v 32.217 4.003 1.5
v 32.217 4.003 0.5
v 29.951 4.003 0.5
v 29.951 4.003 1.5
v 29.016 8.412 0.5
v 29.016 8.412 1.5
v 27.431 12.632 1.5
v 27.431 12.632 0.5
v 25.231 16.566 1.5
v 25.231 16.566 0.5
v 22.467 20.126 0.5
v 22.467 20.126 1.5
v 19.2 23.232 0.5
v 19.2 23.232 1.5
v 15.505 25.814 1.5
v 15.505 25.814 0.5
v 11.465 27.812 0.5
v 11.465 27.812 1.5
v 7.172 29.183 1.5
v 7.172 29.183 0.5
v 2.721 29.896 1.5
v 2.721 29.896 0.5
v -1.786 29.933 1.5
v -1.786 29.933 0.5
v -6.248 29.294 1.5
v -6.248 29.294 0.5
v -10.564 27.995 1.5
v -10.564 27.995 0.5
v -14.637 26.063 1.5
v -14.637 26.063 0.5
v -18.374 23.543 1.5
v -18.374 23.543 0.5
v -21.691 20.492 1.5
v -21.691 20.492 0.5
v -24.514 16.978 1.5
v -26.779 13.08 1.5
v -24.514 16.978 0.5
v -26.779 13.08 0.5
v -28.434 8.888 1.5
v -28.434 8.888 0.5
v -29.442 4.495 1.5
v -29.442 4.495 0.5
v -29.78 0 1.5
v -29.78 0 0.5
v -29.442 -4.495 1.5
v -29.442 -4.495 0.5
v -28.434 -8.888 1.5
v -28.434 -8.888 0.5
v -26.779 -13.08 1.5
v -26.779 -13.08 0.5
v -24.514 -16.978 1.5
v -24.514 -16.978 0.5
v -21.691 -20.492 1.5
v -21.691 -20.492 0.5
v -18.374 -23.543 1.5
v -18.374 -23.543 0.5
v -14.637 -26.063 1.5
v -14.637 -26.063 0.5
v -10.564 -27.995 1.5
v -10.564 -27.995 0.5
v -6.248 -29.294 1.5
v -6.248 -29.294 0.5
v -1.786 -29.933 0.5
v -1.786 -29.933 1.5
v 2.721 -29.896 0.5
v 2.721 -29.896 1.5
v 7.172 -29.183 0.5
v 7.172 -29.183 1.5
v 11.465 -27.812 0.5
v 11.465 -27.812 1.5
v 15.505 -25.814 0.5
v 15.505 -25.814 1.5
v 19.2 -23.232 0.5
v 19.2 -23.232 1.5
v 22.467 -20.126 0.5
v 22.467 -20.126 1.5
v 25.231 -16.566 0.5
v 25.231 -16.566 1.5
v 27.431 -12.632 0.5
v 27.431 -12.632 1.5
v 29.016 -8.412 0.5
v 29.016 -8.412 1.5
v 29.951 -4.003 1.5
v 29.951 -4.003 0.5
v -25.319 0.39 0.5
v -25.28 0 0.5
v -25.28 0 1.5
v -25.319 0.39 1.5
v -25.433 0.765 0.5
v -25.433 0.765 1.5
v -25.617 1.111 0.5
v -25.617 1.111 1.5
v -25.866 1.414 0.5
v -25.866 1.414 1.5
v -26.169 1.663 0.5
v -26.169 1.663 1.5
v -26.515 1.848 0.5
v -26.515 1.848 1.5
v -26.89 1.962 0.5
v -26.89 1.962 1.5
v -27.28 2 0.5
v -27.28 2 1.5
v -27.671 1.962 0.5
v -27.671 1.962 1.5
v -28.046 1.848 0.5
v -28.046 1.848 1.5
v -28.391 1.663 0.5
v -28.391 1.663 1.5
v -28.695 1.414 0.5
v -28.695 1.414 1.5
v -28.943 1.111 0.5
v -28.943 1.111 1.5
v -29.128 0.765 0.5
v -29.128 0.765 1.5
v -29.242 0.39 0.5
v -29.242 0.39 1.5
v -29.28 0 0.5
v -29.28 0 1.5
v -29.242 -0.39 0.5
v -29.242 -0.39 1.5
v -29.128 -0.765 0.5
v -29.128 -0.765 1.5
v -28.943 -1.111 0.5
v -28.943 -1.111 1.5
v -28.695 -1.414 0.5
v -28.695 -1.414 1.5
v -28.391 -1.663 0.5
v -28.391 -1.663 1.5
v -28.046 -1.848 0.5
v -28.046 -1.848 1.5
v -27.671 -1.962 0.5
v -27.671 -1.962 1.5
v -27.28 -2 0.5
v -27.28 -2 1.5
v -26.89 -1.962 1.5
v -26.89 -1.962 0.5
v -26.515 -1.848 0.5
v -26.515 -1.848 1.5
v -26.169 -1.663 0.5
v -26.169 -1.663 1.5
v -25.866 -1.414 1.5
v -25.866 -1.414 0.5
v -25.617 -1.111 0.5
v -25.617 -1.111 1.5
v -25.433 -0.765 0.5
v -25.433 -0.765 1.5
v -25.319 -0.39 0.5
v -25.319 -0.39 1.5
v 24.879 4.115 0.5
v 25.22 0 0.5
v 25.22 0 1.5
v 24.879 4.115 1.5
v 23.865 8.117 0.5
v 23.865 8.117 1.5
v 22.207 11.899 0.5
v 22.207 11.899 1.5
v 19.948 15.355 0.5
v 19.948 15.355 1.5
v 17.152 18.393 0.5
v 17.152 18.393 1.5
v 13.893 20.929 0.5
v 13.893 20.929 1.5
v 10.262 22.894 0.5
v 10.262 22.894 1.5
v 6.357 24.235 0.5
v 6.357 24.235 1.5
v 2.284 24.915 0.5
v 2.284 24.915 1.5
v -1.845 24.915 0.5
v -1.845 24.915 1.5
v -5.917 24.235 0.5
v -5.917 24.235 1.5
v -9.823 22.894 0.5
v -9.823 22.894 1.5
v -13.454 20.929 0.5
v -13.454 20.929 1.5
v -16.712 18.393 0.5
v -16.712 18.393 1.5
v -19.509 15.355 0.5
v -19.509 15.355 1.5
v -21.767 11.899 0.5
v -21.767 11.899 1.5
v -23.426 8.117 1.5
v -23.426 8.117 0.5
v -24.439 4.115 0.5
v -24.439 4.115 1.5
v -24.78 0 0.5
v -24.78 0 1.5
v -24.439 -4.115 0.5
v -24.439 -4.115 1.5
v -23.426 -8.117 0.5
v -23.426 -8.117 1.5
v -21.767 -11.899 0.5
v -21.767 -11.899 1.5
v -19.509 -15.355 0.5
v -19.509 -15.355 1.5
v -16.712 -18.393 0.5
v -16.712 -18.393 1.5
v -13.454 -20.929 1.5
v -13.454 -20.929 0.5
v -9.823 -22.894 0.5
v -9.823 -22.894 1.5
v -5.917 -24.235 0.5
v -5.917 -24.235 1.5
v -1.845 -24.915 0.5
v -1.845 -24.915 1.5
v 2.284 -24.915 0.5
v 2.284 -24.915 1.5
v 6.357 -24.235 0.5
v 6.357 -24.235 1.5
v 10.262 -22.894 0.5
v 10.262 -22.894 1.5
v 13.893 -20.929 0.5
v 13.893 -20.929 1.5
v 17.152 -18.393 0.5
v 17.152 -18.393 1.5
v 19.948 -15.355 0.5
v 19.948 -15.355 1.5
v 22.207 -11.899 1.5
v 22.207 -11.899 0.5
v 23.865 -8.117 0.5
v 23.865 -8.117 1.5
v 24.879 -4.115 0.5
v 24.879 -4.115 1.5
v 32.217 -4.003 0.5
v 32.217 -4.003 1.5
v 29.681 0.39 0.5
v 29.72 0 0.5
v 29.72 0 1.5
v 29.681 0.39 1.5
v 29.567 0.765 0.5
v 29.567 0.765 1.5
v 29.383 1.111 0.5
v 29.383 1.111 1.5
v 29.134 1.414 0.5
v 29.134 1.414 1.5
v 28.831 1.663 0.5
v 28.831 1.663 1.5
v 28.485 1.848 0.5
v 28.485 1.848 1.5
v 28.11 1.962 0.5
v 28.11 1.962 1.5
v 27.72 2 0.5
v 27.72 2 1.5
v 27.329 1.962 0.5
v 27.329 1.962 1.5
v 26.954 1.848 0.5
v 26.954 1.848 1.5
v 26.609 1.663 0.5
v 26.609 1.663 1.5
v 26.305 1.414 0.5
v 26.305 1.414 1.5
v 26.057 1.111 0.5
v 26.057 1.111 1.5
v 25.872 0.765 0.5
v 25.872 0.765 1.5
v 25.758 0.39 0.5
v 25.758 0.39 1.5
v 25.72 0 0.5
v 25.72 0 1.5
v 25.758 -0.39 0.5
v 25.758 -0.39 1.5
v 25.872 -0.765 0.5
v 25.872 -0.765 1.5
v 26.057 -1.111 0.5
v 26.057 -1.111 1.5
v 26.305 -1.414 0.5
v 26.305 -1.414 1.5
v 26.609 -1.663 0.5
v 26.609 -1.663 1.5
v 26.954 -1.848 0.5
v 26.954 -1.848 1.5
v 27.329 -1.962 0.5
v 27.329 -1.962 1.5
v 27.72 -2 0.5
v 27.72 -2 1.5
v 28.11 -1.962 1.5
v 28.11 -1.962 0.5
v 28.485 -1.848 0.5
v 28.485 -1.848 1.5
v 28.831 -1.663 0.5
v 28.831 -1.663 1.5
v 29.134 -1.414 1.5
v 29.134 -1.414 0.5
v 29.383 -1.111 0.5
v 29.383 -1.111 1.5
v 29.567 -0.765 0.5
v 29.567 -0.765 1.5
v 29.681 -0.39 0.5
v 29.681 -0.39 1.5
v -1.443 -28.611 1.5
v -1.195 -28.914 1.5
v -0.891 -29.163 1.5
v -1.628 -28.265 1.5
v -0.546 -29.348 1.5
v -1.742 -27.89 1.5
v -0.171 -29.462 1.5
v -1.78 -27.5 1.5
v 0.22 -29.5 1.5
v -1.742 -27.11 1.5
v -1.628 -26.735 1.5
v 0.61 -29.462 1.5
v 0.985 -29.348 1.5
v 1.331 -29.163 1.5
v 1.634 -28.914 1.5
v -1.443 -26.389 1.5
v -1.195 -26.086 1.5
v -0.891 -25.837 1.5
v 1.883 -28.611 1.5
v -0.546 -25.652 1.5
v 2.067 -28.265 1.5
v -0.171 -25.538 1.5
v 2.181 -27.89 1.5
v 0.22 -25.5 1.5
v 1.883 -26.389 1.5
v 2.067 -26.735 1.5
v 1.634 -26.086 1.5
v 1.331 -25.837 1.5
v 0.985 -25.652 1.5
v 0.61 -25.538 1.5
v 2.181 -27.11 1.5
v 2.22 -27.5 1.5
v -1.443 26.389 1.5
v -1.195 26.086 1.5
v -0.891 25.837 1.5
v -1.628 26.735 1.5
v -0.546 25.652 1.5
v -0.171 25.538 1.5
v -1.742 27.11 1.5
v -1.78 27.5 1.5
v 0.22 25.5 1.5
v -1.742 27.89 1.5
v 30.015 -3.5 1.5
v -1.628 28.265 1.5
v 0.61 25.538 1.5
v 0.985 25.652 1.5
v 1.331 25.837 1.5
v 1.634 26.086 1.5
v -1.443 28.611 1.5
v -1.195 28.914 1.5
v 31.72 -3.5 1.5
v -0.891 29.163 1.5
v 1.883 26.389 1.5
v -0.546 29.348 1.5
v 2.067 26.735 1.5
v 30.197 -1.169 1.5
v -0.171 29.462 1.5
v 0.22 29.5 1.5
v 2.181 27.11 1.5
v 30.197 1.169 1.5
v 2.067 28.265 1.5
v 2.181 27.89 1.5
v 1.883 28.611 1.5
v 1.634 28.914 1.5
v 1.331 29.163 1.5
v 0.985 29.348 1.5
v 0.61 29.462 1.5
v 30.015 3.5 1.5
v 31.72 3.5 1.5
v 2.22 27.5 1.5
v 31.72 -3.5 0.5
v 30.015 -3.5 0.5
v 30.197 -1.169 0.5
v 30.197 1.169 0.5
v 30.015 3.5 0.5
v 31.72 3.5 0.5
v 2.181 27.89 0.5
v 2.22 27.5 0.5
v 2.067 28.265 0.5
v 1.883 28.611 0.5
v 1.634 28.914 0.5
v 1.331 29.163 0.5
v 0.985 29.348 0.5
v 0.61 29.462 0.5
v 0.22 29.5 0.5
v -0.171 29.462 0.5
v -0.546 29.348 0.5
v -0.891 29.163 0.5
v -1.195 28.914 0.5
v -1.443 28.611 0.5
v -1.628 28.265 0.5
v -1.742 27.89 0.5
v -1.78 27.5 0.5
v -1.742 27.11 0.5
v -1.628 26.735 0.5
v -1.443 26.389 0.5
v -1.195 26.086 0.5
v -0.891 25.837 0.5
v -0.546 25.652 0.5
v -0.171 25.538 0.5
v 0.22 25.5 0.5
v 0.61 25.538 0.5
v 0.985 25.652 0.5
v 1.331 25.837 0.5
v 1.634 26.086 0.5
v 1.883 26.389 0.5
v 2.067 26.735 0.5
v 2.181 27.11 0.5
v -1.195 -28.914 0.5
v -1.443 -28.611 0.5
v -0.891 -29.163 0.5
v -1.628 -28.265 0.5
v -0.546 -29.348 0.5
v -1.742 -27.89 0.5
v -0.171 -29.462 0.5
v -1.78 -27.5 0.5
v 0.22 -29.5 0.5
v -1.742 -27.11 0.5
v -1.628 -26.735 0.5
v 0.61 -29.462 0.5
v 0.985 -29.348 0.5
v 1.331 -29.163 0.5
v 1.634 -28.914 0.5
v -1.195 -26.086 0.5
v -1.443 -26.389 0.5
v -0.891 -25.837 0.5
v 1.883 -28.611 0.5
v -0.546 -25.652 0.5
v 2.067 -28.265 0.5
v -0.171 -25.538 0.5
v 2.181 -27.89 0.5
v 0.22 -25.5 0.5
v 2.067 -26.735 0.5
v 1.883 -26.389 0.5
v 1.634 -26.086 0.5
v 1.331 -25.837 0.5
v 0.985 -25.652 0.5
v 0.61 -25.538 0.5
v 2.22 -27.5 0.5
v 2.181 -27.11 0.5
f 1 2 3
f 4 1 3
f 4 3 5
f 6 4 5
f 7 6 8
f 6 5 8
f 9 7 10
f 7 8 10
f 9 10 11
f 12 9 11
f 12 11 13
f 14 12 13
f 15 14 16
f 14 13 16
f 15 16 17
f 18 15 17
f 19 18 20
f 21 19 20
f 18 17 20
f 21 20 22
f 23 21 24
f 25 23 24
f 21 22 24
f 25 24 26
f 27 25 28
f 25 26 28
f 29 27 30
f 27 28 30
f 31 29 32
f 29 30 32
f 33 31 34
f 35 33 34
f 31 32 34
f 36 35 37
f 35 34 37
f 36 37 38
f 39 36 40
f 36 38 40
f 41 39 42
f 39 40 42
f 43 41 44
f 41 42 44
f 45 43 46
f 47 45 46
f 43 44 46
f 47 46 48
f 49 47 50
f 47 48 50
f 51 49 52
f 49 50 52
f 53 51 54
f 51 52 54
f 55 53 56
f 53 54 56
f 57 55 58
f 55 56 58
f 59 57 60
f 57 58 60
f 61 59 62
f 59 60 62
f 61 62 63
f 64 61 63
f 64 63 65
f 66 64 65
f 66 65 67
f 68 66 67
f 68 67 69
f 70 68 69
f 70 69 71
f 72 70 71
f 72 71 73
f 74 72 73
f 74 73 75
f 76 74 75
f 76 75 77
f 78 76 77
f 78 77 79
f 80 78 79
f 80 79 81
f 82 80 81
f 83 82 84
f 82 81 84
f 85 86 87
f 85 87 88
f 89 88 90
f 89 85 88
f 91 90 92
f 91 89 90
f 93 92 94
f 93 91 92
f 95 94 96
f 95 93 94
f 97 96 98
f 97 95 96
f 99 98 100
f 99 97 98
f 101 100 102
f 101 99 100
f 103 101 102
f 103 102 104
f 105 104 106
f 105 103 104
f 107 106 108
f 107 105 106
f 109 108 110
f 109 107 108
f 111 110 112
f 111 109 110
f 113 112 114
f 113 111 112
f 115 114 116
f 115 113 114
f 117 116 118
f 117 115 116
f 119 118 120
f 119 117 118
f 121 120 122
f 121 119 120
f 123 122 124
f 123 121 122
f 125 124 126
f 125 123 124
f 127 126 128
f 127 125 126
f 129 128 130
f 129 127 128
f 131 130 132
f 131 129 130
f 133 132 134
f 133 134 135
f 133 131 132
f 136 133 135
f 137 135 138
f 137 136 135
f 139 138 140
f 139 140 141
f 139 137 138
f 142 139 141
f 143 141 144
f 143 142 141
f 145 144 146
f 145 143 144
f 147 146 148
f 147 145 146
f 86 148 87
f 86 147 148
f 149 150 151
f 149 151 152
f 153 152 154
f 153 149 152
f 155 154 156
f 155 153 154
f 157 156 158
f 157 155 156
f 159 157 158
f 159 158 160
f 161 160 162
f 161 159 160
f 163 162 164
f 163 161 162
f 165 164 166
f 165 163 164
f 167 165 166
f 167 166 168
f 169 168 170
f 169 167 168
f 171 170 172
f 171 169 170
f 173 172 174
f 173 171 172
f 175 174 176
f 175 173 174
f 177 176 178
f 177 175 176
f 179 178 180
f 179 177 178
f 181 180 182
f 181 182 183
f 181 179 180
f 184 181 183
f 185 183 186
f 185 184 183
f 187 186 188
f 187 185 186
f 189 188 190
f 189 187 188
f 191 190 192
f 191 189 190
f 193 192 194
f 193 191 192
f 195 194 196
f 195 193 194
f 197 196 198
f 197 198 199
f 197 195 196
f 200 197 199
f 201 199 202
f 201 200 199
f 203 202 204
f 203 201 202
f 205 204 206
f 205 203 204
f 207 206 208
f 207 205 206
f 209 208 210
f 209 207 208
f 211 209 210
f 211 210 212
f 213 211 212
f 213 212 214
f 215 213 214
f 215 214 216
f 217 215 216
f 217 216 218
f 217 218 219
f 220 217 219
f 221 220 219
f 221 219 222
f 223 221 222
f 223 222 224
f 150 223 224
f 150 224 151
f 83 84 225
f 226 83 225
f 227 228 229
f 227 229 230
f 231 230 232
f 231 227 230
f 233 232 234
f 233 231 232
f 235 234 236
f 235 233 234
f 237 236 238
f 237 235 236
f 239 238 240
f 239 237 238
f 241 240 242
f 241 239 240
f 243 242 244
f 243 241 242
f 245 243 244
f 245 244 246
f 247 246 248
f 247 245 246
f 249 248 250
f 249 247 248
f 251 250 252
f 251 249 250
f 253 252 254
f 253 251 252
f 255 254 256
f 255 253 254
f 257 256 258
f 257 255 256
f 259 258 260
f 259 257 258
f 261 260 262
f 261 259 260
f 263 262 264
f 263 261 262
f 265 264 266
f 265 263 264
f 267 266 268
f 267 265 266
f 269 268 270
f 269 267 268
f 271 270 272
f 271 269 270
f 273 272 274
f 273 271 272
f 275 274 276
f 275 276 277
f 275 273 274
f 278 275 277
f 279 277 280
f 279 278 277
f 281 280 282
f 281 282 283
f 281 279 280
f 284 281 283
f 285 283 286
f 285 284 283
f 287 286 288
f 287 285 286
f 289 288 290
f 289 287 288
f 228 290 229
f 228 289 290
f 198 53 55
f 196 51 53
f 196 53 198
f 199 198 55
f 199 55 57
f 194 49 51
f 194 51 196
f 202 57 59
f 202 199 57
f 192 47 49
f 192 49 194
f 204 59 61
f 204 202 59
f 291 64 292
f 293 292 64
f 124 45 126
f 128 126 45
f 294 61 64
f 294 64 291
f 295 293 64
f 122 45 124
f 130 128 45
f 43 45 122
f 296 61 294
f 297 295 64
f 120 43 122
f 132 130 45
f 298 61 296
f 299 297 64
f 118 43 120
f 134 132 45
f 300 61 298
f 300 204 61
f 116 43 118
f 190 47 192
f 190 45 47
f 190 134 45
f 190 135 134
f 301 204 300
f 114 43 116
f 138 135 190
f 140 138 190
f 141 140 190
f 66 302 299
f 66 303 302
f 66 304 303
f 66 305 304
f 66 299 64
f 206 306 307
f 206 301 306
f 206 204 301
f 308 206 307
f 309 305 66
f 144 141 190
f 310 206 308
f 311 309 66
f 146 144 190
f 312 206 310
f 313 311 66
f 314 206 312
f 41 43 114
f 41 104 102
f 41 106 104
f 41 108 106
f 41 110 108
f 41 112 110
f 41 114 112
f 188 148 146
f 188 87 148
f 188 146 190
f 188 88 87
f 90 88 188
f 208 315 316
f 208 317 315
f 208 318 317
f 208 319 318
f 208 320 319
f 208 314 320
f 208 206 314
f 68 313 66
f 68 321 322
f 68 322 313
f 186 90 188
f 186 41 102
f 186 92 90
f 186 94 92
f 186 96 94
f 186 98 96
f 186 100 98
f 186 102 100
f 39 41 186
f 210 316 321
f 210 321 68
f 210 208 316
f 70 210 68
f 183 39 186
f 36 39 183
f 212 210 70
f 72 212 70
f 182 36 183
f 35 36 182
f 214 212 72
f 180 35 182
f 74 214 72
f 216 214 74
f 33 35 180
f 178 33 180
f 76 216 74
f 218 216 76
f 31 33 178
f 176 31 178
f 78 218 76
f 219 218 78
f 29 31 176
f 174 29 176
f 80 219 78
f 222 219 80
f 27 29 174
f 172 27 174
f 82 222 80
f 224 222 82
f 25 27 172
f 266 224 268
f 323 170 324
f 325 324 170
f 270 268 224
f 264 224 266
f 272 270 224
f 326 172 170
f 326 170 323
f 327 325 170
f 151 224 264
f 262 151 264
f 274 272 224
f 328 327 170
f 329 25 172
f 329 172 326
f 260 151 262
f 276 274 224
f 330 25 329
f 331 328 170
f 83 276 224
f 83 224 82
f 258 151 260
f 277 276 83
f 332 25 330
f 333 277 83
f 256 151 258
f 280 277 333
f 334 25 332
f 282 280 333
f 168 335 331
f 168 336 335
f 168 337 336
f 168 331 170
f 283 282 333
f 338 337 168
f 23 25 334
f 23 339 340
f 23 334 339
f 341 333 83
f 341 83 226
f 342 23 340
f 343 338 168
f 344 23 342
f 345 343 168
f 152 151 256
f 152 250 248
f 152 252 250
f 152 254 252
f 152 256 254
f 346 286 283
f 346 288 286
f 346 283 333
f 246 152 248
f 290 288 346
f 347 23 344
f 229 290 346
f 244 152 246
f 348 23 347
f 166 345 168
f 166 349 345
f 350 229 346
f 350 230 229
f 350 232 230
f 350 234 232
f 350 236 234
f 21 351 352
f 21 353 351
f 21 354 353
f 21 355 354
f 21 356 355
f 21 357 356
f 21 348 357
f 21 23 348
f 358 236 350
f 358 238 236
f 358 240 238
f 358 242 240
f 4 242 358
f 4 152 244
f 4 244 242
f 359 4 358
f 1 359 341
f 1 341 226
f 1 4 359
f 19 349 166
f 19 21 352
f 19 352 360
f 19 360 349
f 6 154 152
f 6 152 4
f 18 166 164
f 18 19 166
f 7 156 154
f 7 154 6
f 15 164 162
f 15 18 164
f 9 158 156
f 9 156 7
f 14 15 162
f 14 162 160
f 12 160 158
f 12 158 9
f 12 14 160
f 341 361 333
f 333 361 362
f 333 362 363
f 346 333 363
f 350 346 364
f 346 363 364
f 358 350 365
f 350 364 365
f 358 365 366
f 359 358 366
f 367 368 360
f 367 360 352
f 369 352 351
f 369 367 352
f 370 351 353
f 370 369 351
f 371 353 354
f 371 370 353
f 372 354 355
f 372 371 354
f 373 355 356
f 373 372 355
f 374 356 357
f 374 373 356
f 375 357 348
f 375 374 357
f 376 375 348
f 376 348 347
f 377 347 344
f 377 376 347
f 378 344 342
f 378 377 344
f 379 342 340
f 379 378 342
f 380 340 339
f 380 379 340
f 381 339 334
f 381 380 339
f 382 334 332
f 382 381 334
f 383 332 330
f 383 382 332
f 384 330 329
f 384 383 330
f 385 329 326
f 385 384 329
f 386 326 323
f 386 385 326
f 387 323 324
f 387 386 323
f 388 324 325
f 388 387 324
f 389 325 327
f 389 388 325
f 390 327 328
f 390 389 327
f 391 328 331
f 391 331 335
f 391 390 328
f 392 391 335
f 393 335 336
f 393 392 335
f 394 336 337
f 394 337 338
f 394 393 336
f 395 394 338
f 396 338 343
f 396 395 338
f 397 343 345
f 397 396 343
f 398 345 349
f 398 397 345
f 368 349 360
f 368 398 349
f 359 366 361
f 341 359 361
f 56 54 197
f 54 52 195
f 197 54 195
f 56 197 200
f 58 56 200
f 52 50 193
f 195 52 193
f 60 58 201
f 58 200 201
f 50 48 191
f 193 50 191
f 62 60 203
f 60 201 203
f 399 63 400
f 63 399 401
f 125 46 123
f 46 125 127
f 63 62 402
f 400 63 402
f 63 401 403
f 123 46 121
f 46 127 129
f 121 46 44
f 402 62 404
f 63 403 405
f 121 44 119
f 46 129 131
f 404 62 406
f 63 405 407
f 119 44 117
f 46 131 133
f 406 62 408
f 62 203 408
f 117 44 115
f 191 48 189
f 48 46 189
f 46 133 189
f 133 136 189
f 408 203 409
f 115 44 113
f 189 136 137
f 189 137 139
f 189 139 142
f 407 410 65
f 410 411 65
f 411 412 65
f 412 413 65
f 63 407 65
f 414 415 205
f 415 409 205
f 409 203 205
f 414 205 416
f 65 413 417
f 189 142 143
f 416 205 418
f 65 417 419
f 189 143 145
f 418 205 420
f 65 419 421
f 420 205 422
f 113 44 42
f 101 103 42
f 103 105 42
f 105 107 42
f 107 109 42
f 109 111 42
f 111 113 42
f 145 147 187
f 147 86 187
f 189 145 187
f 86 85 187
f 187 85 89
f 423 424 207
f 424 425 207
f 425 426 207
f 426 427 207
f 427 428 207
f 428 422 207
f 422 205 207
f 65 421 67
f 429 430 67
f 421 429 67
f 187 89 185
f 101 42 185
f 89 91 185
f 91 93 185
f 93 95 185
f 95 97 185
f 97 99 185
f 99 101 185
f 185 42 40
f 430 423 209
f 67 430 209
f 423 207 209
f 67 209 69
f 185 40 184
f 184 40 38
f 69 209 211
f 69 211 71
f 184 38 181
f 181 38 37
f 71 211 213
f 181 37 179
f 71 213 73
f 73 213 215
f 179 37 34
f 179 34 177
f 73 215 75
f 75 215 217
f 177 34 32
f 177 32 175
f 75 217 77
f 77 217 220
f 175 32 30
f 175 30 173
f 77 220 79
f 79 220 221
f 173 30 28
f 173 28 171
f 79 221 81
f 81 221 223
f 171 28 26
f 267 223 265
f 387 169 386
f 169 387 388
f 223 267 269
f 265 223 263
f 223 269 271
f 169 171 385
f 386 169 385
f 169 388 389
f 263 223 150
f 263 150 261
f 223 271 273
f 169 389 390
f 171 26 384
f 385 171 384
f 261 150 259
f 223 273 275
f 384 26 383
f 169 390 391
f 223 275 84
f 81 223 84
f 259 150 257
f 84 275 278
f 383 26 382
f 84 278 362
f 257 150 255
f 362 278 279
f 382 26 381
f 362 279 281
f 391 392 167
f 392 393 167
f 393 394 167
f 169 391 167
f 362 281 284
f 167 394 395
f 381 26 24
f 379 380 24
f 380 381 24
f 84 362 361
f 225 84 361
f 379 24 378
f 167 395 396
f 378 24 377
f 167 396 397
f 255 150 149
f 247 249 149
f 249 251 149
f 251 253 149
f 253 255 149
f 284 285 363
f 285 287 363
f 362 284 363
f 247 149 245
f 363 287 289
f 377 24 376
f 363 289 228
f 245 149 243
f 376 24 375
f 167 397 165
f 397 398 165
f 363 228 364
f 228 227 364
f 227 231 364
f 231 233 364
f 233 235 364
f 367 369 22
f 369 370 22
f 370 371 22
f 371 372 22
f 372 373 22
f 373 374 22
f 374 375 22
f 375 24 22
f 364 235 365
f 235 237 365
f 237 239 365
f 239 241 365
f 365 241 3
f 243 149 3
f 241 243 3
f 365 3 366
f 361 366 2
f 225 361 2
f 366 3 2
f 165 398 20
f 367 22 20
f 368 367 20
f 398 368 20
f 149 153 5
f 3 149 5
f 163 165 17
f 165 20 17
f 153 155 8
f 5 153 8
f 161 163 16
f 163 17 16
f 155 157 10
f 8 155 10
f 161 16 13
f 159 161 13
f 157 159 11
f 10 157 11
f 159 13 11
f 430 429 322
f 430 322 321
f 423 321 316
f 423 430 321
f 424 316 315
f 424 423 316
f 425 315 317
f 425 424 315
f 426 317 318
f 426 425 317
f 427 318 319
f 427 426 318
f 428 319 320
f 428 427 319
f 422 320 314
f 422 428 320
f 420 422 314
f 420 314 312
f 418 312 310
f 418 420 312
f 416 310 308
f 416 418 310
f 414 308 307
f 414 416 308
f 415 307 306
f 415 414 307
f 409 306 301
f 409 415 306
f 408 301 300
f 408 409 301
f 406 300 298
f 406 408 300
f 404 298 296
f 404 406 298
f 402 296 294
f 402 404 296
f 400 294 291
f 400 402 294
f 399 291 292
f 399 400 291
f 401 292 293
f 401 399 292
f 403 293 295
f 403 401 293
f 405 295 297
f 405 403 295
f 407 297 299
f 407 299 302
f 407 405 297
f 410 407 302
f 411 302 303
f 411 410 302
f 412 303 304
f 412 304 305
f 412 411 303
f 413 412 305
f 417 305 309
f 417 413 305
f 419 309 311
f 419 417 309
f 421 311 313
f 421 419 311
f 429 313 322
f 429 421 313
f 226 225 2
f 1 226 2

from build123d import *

# Parameters (mm, degrees)
CROQUIS1_R              = 4
CROQUIS1_R_2            = 50
SALIENTE_EXTRUIR1_DEPTH = 2
ESCALA1_SCALE           = 0.5


with BuildPart() as part:
    # Croquis1 → Saliente-Extruir1 (new body)
    with BuildSketch(Plane.XY):
        with BuildLine():
            Line((63.995308988, 8.006149239), (59.46344738, 8.006149239))
            ThreePointArc((59.46344738, 8.006149239), (-60, 0), (59.46344738, -8.006149239))
            Line((59.46344738, -8.006149239), (63.995308988, -8.006149239))
            Line((63.995308988, -8.006149239), (63.995308988, 8.006149239))
        make_face()
        with BuildLine():
            Line((63, -7), (59.590267662, -7))
            ThreePointArc((59.590267662, -7), (60, 0), (59.590267662, 7))
            Line((59.590267662, 7), (63, 7))
            Line((63, 7), (63, -7))
        make_face(mode=Mode.SUBTRACT)
        with Locations((0, 55)):
            Circle(CROQUIS1_R, mode=Mode.SUBTRACT)
        with Locations((55, 0)):
            Circle(CROQUIS1_R, mode=Mode.SUBTRACT)
        with Locations((0, -55)):
            Circle(CROQUIS1_R, mode=Mode.SUBTRACT)
        with Locations((-55, 0)):
            Circle(CROQUIS1_R, mode=Mode.SUBTRACT)
        Circle(CROQUIS1_R_2, mode=Mode.SUBTRACT)
    extrude(amount=SALIENTE_EXTRUIR1_DEPTH)


with BuildPart() as part_1:
    # Escala1: scaled about (0.43933496, 0, 1)
    add(part.part.scale(ESCALA1_SCALE).moved(Location((0.21966748, 0, 0.5))))


solid = part_1.part
